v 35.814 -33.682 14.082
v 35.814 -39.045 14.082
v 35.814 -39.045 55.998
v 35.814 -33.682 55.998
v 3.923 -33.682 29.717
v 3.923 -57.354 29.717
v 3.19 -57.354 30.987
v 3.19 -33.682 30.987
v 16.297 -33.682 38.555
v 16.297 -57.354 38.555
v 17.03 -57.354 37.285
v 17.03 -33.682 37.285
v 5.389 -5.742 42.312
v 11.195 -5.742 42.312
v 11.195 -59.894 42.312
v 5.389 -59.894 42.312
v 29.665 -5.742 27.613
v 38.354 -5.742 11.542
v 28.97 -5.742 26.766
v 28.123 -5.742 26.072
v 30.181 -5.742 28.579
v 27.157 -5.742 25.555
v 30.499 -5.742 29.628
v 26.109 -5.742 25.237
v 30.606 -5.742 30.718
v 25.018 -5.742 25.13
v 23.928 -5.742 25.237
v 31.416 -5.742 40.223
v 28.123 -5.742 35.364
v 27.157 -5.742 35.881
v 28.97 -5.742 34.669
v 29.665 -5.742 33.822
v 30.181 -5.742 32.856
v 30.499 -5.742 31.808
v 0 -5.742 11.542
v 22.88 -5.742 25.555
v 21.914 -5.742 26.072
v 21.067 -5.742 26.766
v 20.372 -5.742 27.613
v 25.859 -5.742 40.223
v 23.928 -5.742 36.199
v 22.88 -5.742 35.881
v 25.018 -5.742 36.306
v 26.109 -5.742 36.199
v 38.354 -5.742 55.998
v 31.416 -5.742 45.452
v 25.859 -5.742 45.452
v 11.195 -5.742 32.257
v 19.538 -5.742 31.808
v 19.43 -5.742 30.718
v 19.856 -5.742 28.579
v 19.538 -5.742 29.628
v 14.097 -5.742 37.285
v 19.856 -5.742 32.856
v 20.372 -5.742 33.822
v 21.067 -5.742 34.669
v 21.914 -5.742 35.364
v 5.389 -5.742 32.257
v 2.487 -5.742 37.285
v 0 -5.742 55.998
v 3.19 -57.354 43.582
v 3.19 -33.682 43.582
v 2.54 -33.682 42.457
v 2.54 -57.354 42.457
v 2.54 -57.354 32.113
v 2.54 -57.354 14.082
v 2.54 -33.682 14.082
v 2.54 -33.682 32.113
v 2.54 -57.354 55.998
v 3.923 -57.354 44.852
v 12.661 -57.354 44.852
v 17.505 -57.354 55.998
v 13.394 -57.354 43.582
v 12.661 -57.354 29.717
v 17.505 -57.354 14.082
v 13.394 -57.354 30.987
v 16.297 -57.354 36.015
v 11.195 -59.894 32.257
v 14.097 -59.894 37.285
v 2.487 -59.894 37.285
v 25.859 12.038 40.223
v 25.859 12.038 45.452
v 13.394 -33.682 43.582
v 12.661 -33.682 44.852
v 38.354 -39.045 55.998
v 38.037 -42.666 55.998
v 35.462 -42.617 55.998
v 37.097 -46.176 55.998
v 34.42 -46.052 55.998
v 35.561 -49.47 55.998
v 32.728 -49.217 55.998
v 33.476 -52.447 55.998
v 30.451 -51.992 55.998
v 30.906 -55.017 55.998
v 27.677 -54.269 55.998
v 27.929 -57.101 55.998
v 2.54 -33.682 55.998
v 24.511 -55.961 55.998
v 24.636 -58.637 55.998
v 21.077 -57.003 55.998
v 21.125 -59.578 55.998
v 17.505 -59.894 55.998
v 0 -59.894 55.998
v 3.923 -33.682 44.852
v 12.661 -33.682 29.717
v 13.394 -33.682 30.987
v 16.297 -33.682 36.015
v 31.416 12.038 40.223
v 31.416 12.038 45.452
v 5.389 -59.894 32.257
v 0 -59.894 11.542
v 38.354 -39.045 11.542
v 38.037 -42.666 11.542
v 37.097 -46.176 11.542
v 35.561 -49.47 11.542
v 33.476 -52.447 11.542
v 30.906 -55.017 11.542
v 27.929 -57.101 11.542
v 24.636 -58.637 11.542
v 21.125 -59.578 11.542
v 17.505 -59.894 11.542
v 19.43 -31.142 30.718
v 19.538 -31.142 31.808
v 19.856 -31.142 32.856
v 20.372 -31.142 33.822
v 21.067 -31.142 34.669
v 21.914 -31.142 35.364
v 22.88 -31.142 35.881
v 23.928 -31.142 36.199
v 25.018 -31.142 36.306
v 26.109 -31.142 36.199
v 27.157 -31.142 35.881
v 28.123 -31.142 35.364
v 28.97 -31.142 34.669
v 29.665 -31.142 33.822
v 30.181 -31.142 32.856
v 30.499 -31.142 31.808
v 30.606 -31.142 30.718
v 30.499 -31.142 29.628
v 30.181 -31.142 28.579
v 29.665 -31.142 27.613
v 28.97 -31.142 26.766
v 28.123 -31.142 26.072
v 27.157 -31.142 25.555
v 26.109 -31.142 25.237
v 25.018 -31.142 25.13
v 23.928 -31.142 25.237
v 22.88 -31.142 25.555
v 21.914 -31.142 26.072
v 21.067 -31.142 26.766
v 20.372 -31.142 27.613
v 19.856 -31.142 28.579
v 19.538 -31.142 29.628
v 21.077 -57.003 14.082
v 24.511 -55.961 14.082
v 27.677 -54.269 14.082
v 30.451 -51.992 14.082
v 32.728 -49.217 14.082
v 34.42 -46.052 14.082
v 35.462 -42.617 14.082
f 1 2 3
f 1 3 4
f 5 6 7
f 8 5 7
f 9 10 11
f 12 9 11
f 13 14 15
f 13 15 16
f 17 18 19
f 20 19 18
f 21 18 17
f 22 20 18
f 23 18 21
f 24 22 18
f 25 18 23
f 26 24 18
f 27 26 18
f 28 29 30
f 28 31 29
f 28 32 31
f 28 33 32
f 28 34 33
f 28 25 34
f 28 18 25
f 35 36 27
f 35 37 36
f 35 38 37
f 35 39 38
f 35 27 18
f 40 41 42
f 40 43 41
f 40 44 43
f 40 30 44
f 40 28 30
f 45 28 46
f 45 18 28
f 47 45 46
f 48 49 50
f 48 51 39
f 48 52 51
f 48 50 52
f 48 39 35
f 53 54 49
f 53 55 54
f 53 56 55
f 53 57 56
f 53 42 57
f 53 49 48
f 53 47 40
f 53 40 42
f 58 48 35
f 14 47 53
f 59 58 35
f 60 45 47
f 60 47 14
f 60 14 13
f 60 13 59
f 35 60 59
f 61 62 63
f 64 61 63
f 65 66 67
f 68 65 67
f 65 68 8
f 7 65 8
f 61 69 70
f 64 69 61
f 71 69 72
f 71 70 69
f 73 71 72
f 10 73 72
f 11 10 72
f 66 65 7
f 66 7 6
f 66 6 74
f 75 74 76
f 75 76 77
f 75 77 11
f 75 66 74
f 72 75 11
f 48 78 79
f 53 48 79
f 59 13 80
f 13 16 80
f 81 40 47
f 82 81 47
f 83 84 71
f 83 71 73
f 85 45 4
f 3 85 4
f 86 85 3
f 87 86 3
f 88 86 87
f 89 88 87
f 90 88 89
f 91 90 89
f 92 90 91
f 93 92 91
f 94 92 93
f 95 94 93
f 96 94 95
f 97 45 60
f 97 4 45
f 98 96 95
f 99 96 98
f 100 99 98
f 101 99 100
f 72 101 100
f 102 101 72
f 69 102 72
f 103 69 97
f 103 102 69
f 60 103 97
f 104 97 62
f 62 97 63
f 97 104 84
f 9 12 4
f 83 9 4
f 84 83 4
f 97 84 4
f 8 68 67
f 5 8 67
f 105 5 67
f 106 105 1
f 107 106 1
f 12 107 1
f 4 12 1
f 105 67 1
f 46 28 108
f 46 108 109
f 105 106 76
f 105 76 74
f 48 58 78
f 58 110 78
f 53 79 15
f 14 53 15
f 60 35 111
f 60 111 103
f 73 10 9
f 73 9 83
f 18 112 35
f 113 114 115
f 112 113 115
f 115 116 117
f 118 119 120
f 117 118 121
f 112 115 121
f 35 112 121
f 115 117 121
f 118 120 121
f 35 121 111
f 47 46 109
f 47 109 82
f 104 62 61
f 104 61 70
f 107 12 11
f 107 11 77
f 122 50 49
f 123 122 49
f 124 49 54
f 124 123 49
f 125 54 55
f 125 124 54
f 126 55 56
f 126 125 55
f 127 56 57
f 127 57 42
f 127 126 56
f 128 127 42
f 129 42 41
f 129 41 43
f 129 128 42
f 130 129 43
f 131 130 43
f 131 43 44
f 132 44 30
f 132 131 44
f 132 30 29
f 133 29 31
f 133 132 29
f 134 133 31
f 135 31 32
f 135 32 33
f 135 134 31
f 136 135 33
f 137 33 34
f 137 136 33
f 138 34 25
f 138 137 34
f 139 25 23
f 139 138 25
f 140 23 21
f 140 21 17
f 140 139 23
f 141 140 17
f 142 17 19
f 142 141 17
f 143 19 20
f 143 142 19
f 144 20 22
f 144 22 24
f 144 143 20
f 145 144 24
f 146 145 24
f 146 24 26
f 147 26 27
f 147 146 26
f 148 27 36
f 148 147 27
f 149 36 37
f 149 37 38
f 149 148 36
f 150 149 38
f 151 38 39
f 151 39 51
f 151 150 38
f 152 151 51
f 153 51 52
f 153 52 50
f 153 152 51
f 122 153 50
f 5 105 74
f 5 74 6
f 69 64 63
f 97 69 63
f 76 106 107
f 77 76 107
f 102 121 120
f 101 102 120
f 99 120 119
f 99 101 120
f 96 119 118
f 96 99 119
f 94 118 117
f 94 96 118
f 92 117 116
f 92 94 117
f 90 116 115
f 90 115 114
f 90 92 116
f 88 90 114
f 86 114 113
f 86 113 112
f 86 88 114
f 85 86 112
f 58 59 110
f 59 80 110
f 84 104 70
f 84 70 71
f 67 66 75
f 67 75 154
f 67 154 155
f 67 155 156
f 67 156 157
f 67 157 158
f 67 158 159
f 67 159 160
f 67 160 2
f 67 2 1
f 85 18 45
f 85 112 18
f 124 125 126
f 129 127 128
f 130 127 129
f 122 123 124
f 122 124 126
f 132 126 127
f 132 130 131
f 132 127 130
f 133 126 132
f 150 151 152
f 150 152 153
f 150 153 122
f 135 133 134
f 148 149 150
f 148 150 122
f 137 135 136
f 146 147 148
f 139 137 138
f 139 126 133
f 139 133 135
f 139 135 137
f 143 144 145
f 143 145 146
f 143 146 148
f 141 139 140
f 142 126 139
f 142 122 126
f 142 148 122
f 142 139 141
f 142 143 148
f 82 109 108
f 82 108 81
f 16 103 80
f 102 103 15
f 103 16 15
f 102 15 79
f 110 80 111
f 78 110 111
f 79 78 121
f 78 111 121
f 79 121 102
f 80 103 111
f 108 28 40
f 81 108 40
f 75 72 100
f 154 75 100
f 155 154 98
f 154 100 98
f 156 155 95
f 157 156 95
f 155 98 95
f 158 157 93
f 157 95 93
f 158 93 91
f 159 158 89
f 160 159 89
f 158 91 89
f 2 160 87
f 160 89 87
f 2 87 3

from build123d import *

# Parameters (mm, degrees)
F0_W        = 28.7528
F0_H        = 19.3099416792
F1_DEPTH    = 38.354
F2_DEPTH    = 25.146
F3_R        = 20.8491483247
F5_DEPTH    = 29.972
F6_T        = 2.54
F6_T3_DEPTH = 33.8328
F8_W        = 5.5572818965
F8_H        = 5.2297823131
F9_DEPTH    = 17.78
F9_FACE_W   = 5.5572818965
F9_FACE_H   = 5.2297823131
F7_W        = 38.354
F7_H        = 44.4559416792
F7_R        = 5.5881190885
F10_DEPTH   = 25.4


# Not quite as in the source:
# - a shell that OpenCascade refuses in one call is made with other operations: the cavity is built on its own and cut out


with BuildPart() as f1:
    # F0 (on Right) → F1 (new body)
    with BuildSketch(Plane.YZ):
        with Locations((-45.5179288597, 21.1969297379)):
            Rectangle(F0_W, F0_H)
    extrude(amount=F1_DEPTH)

    # F2 (add): a face of the model
    f2_faces = [f1.faces().sort_by_distance(p)[0] for p in [
        (19.177, -45.5179288597, 30.8519005775),
    ]]
    extrude(f2_faces, amount=F2_DEPTH)

    # F3
    f3_edges = [f1.edges().sort_by_distance(p)[0] for p in [
        (38.354, -59.894329, 33.76993),
    ]]
    fillet(f3_edges, radius=F3_R)

    # F4 (on face) → F5 (cut)
    with BuildSketch(Plane.XZ.offset(59.8943288597)):
        Polygon((5.3893399472, 32.2574861348), (11.1945441877, 32.2574861348), (14.0971463079, 37.2849404812), (11.1945441877, 42.3123948276), (5.3893399472, 42.3123948276), (2.486737827, 37.2849404812), align=None)
    extrude(amount=-F5_DEPTH, mode=Mode.SUBTRACT)

    # F6: shell of thickness 2.54, made by hand


with BuildPart() as f6_core1:
    # F6_t2: copy of F1
    add(f1.part)

    # the walls: a layer under each face that stays
    f6_faces = [f6_core1.faces().sort_by_distance(p)[0] for p in [
        (14.5873763961, -59.8943288597, 48.5885769643),
        (19.177, -45.5179288597, 11.5419588983),
        (32.2474258377, -53.7877546974, 33.7699297379),
        (0, -45.5179288597, 33.7699297379),
        (3.9380388871, -45.5179288597, 39.7986676544),
        (8.2919420674, -45.5179288597, 42.3123948276),
        (12.6458452478, -45.5179288597, 39.7986676544),
        (12.6458452478, -45.5179288597, 34.771213308),
        (8.2919420674, -45.5179288597, 32.2574861348),
        (3.9380388871, -45.5179288597, 34.771213308),
        (38.354, -35.0933546974, 33.7699297379),
        (19.177, -31.1415288597, 33.7699297379),
    ]]
    thicken(f6_faces, amount=-F6_T, mode=Mode.SUBTRACT)

    # F6_s4 → F6_t3 (cut)
    with BuildSketch(Plane.XZ.offset(28.6015288597)):
        Polygon((2.5307319175, 37.2849404812), (0.2870333013, 38.5549404812), (-0.4462015405, 37.2849404812), (0.2870333013, 36.0149404812), align=None)
        Polygon((5.4113369925, 42.2742948276), (3.1896354216, 43.5823948276), (3.9228702635, 44.8523948276), (5.3893399472, 44.8523948276), align=None)
        Polygon((11.1725471424, 42.2742948276), (11.1945441877, 44.8523948276), (12.6610138714, 44.8523948276), (13.3942487133, 43.5823948276), align=None)
        Polygon((14.0531522174, 37.2849404812), (16.2968508335, 38.5549404812), (17.0300856754, 37.2849404812), (16.2968508335, 36.0149404812), align=None)
        Polygon((11.1725471424, 32.2955861348), (13.3942487133, 30.9874861348), (12.6610138714, 29.7174861348), (11.1945441877, 29.7174861348), align=None)
        Polygon((5.4113369925, 32.2955861348), (5.3893399472, 29.7174861348), (3.9228702635, 29.7174861348), (3.1896354216, 30.9874861348), align=None)
    extrude(amount=F6_T3_DEPTH, mode=Mode.SUBTRACT)


with BuildPart() as f1_1:
    add(f1.part)

    # what is left inside the walls is the cavity
    f6_cavity = [f6_core1.part.solids().sort_by_distance(p)[0] for p in [
        (24.722667, -33.706929, 35.03993),
    ]]
    add(f6_cavity, mode=Mode.SUBTRACT)

    # F8 (on face) → F9 (join)
    with BuildSketch(Plane(origin=(0, -31.1415288597, 0), x_dir=(-1, 0, 0), z_dir=(0, 1, 0))):
        with Locations((-28.6376820877, 42.8374167532)):
            Rectangle(F8_W, F8_H)
    extrude(amount=F9_DEPTH)

    # F9_face (on face) + F7 (on face) → F10 (join)
    with BuildSketch(Plane(origin=(28.6376820877, -13.3615288597, 42.8374167532), x_dir=(-1, 0, 0), z_dir=(0, 1, 0))):
        Rectangle(F9_FACE_W, F9_FACE_H)
    with BuildSketch(Plane(origin=(0, -31.1415288597, 0), x_dir=(-1, 0, 0), z_dir=(0, 1, 0))):
        with Locations((-19.177, 33.7699297379)):
            Rectangle(F7_W, F7_H)
        with Locations((-25.0183418393, 30.7178907096)):
            Circle(F7_R, mode=Mode.SUBTRACT)
        Polygon((-5.3893399472, 42.3123948276), (-2.486737827, 37.2849404812), (-5.3893399472, 32.2574861348), (-11.1945441877, 32.2574861348), (-14.0971463079, 37.2849404812), (-11.1945441877, 42.3123948276), align=None, mode=Mode.SUBTRACT)
    extrude(amount=F10_DEPTH)


solid = f1_1.part
